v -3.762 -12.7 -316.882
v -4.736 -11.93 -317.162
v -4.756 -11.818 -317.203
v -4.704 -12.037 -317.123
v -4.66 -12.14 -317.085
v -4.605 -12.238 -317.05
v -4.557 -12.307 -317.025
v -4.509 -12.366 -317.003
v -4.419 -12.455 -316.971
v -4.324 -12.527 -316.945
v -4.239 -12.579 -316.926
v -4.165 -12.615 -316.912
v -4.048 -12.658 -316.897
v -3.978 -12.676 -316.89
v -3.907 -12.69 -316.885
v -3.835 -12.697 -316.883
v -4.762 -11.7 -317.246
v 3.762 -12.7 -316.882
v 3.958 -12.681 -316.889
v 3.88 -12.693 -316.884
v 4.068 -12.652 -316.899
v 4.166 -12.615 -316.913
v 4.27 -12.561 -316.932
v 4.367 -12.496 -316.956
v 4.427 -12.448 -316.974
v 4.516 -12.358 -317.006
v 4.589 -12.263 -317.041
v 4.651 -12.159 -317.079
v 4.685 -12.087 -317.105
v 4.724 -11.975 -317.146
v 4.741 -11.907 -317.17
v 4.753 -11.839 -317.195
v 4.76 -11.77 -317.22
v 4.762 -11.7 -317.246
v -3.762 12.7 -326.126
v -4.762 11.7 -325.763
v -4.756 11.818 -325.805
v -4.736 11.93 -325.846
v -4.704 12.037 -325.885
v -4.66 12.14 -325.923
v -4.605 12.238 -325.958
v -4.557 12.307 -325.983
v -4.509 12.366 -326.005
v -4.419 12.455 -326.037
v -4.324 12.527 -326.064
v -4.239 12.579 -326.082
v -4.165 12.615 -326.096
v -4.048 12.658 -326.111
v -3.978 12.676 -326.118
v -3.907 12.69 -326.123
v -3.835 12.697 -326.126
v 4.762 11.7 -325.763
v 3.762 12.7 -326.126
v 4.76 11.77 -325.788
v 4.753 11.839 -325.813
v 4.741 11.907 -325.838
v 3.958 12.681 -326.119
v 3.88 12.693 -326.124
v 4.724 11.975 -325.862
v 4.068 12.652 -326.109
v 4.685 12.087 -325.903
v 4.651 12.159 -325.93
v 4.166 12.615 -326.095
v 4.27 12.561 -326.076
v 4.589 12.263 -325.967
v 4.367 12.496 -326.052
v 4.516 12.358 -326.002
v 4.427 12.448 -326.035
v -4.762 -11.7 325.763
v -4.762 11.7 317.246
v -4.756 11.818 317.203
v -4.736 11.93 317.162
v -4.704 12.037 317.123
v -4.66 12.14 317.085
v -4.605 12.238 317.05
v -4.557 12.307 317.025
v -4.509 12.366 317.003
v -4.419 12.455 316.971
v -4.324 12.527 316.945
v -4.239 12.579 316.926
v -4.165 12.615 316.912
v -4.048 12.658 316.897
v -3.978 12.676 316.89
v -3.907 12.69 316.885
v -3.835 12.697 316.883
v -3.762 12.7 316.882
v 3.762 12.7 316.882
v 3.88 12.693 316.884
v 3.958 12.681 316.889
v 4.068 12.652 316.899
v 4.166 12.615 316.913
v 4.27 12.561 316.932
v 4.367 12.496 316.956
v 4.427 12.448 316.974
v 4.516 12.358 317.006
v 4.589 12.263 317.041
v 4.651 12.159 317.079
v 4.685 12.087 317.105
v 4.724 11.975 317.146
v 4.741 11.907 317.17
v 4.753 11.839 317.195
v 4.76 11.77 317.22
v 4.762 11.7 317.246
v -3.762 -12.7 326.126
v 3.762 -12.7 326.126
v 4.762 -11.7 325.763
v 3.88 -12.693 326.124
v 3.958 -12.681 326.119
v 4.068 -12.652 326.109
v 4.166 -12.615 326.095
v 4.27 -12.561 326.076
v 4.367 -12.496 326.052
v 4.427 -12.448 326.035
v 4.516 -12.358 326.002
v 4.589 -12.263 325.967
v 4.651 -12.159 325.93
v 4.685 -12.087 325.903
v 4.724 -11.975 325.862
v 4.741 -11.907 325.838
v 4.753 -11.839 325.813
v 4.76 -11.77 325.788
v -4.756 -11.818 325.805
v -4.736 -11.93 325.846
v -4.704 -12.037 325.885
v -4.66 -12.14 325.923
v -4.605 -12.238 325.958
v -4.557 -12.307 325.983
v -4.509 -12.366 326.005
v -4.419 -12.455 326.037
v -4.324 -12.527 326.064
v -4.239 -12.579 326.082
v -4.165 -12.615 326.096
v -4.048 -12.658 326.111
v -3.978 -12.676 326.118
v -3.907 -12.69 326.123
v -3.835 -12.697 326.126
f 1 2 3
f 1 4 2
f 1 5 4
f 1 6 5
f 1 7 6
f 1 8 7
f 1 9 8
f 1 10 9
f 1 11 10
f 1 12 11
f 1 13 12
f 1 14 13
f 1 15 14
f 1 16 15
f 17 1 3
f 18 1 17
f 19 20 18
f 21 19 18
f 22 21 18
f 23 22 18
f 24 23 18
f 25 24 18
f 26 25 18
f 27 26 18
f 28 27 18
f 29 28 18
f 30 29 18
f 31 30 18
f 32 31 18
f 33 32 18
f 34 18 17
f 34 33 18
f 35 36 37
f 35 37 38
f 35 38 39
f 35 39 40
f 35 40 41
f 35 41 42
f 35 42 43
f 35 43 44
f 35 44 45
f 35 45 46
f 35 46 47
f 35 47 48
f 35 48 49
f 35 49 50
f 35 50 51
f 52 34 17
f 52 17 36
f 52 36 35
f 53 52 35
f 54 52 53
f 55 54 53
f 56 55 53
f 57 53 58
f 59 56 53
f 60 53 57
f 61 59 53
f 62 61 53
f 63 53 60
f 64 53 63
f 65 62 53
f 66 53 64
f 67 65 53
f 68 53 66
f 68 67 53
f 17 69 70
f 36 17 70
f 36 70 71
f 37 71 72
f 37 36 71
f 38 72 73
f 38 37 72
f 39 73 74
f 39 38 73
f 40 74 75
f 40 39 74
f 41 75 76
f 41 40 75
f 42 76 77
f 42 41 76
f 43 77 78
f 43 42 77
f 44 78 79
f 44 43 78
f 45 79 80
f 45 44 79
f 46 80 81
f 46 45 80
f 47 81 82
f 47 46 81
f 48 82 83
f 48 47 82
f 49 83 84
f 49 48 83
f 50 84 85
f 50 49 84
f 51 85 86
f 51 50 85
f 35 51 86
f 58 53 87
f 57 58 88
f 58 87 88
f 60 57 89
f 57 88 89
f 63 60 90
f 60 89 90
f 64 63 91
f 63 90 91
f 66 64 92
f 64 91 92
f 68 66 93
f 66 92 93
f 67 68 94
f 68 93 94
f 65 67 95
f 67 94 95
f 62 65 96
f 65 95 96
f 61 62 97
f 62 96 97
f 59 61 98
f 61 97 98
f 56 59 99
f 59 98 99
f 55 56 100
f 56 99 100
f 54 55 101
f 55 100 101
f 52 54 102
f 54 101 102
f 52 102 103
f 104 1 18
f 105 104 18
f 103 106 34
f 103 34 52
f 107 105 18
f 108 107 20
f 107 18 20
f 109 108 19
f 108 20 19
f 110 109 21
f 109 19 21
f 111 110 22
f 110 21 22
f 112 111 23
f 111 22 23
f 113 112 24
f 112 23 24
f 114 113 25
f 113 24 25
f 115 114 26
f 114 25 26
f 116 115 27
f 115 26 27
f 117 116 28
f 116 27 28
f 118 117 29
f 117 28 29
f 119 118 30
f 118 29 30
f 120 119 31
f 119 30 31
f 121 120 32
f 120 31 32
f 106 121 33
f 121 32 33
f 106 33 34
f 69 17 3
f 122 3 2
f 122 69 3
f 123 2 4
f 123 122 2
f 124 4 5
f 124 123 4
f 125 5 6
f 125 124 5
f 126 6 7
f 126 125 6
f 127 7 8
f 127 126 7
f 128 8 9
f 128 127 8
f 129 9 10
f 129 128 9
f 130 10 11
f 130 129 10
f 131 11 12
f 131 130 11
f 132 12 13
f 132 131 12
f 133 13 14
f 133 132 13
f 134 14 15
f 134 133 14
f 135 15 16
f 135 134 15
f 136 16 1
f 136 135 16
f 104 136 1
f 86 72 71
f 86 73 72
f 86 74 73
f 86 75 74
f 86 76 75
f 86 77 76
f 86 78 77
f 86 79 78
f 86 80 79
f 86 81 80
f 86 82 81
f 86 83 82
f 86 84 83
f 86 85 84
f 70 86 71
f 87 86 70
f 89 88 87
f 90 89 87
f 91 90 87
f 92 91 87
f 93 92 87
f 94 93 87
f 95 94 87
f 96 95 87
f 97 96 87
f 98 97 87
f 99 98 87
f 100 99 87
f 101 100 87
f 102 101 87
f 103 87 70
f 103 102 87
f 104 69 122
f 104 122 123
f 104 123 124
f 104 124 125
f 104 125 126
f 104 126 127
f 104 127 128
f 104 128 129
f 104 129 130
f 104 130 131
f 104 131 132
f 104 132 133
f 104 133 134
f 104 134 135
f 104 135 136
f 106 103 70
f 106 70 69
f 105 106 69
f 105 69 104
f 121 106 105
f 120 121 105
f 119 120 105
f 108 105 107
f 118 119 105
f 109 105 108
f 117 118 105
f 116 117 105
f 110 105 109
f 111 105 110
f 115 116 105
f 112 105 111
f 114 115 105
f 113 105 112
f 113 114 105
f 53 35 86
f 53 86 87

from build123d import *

# Parameters (mm, degrees)
ESBO_O1_W                = 9.525
ESBO_O1_H                = 25.4
RESSALTO_EXTRUS_O1_DEPTH = 400
ESBO_O3_OUTSIDE_W        = 962.092
ESBO_O3_OUTSIDE_H        = 187.492
CORTE_EXTRUS_O2_DEPTH    = 401.314895582
FILETE1_R                = 1


with BuildPart() as part:
    # Esboço1 → Ressalto-extrusão1 (new, symmetric)
    with BuildSketch(Plane.XY):
        Rectangle(ESBO_O1_W, ESBO_O1_H)
    extrude(amount=RESSALTO_EXTRUS_O1_DEPTH, both=True)

    # Esboço3 outside → Corte-extrusão2 (cut, through all)
    with BuildSketch(Plane(origin=(4.7625, 0, 0), x_dir=(0, 0, -1), z_dir=(1, 0, 0))):
        Rectangle(ESBO_O3_OUTSIDE_W, ESBO_O3_OUTSIDE_H)
        Polygon((-326.126489707, -12.7), (316.881645756, -12.7), (326.126489707, 12.7), (-316.881645756, 12.7), align=None, mode=Mode.SUBTRACT)
    extrude(amount=-CORTE_EXTRUS_O2_DEPTH, mode=Mode.SUBTRACT)

    # Filete1
    filete1_edges = [part.edges().sort_by_distance(p)[0] for p in [
        (4.7625, -12.7, 4.622421975),
        (-4.7625, -12.7, 4.622421975),
        (-4.7625, 12.7, -4.622421975),
        (4.7625, 12.7, -4.622421975),
    ]]
    fillet(filete1_edges, radius=FILETE1_R)


solid = part.part
